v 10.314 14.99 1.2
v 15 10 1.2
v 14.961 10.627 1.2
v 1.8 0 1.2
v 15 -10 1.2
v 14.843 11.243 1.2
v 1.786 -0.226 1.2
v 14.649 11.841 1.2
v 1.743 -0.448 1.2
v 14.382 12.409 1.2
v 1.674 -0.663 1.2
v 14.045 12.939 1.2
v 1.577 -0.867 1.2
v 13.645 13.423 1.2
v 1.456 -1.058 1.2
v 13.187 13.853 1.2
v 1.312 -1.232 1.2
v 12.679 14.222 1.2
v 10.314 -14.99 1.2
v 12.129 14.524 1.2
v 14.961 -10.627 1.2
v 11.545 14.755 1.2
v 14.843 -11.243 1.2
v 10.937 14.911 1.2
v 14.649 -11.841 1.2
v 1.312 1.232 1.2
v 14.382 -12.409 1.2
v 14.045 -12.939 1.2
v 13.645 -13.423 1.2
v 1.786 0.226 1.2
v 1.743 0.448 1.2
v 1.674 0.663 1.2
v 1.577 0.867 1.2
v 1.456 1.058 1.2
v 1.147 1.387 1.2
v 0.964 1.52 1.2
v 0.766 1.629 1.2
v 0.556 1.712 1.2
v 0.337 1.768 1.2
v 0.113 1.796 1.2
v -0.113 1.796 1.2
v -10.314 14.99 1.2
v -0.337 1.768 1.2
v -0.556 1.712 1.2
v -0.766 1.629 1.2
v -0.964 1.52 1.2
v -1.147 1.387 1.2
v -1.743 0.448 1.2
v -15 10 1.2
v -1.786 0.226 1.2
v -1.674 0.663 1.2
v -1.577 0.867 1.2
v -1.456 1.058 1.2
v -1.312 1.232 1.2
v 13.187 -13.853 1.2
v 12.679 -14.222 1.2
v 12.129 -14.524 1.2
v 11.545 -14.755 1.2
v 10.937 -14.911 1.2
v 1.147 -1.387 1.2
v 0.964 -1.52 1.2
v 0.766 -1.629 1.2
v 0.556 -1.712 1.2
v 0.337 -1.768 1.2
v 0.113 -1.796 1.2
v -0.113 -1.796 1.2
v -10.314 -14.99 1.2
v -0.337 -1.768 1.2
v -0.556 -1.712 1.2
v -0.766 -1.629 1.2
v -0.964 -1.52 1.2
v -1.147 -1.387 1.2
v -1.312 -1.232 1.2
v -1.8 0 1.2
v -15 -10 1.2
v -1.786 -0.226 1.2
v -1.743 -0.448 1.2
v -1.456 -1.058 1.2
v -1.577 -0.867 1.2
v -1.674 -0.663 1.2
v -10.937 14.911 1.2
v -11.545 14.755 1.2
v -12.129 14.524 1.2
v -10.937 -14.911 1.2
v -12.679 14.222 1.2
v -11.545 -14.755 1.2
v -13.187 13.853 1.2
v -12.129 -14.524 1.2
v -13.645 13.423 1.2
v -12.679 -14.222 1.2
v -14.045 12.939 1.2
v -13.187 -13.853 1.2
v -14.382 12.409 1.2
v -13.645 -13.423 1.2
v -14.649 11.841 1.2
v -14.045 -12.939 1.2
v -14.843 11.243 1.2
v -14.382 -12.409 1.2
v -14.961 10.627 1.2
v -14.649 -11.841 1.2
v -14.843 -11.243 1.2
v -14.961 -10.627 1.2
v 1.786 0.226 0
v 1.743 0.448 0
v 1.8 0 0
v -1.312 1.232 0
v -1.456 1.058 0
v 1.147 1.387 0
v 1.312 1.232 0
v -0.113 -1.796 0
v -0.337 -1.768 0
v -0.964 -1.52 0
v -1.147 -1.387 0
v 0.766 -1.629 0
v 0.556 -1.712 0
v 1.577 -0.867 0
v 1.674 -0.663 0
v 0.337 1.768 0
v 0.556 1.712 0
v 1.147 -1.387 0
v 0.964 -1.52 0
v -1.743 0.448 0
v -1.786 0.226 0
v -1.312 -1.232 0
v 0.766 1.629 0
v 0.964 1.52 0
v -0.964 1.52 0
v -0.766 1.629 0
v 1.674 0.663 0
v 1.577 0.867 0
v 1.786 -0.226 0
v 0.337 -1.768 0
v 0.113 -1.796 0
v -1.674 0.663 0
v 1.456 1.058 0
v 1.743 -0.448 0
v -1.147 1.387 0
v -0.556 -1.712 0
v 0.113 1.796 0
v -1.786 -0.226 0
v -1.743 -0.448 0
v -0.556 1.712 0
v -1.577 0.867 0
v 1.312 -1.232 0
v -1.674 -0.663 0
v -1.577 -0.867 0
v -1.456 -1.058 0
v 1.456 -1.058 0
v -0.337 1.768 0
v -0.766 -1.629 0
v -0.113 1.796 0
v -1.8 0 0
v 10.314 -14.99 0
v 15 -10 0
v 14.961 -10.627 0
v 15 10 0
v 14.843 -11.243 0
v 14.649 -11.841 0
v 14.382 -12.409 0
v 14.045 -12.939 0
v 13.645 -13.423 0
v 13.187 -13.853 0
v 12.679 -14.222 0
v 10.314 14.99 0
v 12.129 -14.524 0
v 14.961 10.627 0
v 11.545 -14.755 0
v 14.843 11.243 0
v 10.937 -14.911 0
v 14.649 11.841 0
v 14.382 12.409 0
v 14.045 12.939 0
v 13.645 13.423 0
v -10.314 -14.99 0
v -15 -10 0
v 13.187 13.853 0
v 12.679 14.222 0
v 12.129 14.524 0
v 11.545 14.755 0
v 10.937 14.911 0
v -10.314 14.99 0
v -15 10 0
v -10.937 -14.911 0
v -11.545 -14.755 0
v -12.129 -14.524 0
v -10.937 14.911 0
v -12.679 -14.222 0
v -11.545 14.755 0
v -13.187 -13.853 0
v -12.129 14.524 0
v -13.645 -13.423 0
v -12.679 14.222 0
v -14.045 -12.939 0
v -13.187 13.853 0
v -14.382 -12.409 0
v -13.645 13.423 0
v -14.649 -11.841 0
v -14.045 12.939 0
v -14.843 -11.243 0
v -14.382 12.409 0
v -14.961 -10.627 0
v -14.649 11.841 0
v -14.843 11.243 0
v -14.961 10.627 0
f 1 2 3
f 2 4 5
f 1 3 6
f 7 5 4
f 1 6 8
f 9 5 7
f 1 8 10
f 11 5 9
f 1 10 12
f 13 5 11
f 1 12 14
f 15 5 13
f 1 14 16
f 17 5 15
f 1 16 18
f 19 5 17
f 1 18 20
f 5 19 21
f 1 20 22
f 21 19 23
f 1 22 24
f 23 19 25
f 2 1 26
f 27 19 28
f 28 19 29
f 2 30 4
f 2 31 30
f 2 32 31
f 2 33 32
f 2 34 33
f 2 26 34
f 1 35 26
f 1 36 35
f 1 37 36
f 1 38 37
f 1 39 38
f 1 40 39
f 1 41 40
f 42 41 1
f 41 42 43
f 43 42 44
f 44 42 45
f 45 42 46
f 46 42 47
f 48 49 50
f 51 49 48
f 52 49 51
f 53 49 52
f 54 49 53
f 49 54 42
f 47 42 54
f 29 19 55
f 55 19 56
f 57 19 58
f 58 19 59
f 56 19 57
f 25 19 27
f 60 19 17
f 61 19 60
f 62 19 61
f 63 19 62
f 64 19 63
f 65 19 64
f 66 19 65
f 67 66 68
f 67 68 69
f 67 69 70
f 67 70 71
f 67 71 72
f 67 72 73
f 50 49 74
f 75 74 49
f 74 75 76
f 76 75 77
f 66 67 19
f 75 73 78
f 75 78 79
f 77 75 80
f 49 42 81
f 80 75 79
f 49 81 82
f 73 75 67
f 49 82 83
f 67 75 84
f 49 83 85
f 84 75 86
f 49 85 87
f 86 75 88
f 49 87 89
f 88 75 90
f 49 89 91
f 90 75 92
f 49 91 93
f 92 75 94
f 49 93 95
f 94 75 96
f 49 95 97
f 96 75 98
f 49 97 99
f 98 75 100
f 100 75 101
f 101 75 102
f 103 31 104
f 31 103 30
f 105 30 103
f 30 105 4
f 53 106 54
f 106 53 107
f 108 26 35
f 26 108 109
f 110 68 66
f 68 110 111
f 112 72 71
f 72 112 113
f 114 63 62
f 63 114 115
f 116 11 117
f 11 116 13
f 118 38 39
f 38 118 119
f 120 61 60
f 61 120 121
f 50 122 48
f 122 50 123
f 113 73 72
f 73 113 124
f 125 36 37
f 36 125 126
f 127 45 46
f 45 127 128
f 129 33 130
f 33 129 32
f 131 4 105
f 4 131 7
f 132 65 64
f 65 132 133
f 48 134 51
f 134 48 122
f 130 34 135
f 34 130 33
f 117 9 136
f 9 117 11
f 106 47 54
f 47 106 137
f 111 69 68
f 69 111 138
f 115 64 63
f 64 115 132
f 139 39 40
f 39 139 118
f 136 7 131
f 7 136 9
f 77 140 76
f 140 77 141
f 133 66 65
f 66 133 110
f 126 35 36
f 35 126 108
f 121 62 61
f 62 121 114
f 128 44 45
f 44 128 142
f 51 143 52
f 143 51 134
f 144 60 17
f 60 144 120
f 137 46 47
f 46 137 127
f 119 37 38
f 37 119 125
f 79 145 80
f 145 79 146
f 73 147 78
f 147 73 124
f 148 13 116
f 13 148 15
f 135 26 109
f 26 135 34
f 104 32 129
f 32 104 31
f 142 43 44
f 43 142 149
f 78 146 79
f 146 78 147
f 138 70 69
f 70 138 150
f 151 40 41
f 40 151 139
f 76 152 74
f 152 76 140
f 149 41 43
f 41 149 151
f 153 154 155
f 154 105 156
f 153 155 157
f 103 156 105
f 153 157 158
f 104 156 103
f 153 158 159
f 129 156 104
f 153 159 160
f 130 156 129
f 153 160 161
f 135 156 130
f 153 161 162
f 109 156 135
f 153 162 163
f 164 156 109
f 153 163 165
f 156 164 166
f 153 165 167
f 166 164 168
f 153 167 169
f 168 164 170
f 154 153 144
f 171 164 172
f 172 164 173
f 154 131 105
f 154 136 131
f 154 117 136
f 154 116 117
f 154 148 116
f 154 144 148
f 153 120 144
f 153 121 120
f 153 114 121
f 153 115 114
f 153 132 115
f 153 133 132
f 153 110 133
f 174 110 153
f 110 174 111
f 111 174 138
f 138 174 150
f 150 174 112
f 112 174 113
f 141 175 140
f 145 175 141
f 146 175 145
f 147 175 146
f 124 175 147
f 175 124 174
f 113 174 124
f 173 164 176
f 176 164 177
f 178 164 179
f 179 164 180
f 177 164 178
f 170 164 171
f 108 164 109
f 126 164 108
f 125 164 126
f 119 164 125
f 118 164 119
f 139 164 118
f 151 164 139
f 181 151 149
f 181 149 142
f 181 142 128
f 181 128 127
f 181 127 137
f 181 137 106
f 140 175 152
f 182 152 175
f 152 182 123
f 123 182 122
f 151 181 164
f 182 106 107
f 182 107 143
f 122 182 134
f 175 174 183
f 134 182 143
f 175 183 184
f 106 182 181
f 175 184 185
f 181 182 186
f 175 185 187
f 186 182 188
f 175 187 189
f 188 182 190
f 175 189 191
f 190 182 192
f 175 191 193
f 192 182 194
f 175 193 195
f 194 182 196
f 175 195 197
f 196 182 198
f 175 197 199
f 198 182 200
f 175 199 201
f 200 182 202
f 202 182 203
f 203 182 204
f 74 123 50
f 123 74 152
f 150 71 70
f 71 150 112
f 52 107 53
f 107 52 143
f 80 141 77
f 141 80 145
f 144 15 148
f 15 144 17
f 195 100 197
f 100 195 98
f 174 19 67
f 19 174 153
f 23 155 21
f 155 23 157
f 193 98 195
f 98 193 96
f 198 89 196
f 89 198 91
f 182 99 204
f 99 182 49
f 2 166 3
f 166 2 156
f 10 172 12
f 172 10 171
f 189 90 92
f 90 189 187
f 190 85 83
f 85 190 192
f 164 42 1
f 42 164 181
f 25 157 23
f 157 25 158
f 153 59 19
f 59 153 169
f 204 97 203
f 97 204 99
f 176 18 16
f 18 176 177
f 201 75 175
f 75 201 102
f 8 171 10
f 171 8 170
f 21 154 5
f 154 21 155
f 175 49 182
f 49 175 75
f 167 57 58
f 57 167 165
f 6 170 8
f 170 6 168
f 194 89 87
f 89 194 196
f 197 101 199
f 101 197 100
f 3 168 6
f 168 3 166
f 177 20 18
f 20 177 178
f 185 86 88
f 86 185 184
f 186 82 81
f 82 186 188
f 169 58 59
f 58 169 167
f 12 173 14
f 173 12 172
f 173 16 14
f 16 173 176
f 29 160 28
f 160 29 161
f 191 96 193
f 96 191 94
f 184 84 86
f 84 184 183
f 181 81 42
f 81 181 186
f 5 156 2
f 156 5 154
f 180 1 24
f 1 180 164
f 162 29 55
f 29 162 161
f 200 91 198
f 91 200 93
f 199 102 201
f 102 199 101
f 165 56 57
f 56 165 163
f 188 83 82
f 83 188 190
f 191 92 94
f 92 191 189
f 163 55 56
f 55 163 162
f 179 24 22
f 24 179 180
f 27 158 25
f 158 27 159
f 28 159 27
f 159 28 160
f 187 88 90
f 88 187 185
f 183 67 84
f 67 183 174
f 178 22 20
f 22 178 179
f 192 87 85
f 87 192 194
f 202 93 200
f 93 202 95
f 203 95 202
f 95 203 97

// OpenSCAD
$fn = 50;


difference() {
	union() {
		hull() {
			translate(v = [-10.0000000000, 10.0000000000, 0]) {
				cylinder(h = 24, r = 5);
			}
			translate(v = [10.0000000000, 10.0000000000, 0]) {
				cylinder(h = 24, r = 5);
			}
			translate(v = [-10.0000000000, -10.0000000000, 0]) {
				cylinder(h = 24, r = 5);
			}
			translate(v = [10.0000000000, -10.0000000000, 0]) {
				cylinder(h = 24, r = 5);
			}
		}
	}
	union() {
		translate(v = [0, 0, 1.2000000000]) {
			hull() {
				translate(v = [-10.0000000000, 10.0000000000, 0]) {
					cylinder(h = 22.8000000000, r = 3.8000000000);
				}
				translate(v = [10.0000000000, 10.0000000000, 0]) {
					cylinder(h = 22.8000000000, r = 3.8000000000);
				}
				translate(v = [-10.0000000000, -10.0000000000, 0]) {
					cylinder(h = 22.8000000000, r = 3.8000000000);
				}
				translate(v = [10.0000000000, -10.0000000000, 0]) {
					cylinder(h = 22.8000000000, r = 3.8000000000);
				}
			}
		}
		#cylinder(h = 1.2000000000, r = 1.8000000000);
		translate(v = [-250.0000000000, -250.0000000000, 1.2000000000]) {
			cube(size = [500, 500, 500]);
		}
		translate(v = [-250.0000000000, -250.0000000000, 1.2000000000]) {
			cube(size = [500, 500, 500]);
		}
		translate(v = [-250.0000000000, -250.0000000000, 1.2000000000]) {
			cube(size = [500, 500, 500]);
		}
	}
}
